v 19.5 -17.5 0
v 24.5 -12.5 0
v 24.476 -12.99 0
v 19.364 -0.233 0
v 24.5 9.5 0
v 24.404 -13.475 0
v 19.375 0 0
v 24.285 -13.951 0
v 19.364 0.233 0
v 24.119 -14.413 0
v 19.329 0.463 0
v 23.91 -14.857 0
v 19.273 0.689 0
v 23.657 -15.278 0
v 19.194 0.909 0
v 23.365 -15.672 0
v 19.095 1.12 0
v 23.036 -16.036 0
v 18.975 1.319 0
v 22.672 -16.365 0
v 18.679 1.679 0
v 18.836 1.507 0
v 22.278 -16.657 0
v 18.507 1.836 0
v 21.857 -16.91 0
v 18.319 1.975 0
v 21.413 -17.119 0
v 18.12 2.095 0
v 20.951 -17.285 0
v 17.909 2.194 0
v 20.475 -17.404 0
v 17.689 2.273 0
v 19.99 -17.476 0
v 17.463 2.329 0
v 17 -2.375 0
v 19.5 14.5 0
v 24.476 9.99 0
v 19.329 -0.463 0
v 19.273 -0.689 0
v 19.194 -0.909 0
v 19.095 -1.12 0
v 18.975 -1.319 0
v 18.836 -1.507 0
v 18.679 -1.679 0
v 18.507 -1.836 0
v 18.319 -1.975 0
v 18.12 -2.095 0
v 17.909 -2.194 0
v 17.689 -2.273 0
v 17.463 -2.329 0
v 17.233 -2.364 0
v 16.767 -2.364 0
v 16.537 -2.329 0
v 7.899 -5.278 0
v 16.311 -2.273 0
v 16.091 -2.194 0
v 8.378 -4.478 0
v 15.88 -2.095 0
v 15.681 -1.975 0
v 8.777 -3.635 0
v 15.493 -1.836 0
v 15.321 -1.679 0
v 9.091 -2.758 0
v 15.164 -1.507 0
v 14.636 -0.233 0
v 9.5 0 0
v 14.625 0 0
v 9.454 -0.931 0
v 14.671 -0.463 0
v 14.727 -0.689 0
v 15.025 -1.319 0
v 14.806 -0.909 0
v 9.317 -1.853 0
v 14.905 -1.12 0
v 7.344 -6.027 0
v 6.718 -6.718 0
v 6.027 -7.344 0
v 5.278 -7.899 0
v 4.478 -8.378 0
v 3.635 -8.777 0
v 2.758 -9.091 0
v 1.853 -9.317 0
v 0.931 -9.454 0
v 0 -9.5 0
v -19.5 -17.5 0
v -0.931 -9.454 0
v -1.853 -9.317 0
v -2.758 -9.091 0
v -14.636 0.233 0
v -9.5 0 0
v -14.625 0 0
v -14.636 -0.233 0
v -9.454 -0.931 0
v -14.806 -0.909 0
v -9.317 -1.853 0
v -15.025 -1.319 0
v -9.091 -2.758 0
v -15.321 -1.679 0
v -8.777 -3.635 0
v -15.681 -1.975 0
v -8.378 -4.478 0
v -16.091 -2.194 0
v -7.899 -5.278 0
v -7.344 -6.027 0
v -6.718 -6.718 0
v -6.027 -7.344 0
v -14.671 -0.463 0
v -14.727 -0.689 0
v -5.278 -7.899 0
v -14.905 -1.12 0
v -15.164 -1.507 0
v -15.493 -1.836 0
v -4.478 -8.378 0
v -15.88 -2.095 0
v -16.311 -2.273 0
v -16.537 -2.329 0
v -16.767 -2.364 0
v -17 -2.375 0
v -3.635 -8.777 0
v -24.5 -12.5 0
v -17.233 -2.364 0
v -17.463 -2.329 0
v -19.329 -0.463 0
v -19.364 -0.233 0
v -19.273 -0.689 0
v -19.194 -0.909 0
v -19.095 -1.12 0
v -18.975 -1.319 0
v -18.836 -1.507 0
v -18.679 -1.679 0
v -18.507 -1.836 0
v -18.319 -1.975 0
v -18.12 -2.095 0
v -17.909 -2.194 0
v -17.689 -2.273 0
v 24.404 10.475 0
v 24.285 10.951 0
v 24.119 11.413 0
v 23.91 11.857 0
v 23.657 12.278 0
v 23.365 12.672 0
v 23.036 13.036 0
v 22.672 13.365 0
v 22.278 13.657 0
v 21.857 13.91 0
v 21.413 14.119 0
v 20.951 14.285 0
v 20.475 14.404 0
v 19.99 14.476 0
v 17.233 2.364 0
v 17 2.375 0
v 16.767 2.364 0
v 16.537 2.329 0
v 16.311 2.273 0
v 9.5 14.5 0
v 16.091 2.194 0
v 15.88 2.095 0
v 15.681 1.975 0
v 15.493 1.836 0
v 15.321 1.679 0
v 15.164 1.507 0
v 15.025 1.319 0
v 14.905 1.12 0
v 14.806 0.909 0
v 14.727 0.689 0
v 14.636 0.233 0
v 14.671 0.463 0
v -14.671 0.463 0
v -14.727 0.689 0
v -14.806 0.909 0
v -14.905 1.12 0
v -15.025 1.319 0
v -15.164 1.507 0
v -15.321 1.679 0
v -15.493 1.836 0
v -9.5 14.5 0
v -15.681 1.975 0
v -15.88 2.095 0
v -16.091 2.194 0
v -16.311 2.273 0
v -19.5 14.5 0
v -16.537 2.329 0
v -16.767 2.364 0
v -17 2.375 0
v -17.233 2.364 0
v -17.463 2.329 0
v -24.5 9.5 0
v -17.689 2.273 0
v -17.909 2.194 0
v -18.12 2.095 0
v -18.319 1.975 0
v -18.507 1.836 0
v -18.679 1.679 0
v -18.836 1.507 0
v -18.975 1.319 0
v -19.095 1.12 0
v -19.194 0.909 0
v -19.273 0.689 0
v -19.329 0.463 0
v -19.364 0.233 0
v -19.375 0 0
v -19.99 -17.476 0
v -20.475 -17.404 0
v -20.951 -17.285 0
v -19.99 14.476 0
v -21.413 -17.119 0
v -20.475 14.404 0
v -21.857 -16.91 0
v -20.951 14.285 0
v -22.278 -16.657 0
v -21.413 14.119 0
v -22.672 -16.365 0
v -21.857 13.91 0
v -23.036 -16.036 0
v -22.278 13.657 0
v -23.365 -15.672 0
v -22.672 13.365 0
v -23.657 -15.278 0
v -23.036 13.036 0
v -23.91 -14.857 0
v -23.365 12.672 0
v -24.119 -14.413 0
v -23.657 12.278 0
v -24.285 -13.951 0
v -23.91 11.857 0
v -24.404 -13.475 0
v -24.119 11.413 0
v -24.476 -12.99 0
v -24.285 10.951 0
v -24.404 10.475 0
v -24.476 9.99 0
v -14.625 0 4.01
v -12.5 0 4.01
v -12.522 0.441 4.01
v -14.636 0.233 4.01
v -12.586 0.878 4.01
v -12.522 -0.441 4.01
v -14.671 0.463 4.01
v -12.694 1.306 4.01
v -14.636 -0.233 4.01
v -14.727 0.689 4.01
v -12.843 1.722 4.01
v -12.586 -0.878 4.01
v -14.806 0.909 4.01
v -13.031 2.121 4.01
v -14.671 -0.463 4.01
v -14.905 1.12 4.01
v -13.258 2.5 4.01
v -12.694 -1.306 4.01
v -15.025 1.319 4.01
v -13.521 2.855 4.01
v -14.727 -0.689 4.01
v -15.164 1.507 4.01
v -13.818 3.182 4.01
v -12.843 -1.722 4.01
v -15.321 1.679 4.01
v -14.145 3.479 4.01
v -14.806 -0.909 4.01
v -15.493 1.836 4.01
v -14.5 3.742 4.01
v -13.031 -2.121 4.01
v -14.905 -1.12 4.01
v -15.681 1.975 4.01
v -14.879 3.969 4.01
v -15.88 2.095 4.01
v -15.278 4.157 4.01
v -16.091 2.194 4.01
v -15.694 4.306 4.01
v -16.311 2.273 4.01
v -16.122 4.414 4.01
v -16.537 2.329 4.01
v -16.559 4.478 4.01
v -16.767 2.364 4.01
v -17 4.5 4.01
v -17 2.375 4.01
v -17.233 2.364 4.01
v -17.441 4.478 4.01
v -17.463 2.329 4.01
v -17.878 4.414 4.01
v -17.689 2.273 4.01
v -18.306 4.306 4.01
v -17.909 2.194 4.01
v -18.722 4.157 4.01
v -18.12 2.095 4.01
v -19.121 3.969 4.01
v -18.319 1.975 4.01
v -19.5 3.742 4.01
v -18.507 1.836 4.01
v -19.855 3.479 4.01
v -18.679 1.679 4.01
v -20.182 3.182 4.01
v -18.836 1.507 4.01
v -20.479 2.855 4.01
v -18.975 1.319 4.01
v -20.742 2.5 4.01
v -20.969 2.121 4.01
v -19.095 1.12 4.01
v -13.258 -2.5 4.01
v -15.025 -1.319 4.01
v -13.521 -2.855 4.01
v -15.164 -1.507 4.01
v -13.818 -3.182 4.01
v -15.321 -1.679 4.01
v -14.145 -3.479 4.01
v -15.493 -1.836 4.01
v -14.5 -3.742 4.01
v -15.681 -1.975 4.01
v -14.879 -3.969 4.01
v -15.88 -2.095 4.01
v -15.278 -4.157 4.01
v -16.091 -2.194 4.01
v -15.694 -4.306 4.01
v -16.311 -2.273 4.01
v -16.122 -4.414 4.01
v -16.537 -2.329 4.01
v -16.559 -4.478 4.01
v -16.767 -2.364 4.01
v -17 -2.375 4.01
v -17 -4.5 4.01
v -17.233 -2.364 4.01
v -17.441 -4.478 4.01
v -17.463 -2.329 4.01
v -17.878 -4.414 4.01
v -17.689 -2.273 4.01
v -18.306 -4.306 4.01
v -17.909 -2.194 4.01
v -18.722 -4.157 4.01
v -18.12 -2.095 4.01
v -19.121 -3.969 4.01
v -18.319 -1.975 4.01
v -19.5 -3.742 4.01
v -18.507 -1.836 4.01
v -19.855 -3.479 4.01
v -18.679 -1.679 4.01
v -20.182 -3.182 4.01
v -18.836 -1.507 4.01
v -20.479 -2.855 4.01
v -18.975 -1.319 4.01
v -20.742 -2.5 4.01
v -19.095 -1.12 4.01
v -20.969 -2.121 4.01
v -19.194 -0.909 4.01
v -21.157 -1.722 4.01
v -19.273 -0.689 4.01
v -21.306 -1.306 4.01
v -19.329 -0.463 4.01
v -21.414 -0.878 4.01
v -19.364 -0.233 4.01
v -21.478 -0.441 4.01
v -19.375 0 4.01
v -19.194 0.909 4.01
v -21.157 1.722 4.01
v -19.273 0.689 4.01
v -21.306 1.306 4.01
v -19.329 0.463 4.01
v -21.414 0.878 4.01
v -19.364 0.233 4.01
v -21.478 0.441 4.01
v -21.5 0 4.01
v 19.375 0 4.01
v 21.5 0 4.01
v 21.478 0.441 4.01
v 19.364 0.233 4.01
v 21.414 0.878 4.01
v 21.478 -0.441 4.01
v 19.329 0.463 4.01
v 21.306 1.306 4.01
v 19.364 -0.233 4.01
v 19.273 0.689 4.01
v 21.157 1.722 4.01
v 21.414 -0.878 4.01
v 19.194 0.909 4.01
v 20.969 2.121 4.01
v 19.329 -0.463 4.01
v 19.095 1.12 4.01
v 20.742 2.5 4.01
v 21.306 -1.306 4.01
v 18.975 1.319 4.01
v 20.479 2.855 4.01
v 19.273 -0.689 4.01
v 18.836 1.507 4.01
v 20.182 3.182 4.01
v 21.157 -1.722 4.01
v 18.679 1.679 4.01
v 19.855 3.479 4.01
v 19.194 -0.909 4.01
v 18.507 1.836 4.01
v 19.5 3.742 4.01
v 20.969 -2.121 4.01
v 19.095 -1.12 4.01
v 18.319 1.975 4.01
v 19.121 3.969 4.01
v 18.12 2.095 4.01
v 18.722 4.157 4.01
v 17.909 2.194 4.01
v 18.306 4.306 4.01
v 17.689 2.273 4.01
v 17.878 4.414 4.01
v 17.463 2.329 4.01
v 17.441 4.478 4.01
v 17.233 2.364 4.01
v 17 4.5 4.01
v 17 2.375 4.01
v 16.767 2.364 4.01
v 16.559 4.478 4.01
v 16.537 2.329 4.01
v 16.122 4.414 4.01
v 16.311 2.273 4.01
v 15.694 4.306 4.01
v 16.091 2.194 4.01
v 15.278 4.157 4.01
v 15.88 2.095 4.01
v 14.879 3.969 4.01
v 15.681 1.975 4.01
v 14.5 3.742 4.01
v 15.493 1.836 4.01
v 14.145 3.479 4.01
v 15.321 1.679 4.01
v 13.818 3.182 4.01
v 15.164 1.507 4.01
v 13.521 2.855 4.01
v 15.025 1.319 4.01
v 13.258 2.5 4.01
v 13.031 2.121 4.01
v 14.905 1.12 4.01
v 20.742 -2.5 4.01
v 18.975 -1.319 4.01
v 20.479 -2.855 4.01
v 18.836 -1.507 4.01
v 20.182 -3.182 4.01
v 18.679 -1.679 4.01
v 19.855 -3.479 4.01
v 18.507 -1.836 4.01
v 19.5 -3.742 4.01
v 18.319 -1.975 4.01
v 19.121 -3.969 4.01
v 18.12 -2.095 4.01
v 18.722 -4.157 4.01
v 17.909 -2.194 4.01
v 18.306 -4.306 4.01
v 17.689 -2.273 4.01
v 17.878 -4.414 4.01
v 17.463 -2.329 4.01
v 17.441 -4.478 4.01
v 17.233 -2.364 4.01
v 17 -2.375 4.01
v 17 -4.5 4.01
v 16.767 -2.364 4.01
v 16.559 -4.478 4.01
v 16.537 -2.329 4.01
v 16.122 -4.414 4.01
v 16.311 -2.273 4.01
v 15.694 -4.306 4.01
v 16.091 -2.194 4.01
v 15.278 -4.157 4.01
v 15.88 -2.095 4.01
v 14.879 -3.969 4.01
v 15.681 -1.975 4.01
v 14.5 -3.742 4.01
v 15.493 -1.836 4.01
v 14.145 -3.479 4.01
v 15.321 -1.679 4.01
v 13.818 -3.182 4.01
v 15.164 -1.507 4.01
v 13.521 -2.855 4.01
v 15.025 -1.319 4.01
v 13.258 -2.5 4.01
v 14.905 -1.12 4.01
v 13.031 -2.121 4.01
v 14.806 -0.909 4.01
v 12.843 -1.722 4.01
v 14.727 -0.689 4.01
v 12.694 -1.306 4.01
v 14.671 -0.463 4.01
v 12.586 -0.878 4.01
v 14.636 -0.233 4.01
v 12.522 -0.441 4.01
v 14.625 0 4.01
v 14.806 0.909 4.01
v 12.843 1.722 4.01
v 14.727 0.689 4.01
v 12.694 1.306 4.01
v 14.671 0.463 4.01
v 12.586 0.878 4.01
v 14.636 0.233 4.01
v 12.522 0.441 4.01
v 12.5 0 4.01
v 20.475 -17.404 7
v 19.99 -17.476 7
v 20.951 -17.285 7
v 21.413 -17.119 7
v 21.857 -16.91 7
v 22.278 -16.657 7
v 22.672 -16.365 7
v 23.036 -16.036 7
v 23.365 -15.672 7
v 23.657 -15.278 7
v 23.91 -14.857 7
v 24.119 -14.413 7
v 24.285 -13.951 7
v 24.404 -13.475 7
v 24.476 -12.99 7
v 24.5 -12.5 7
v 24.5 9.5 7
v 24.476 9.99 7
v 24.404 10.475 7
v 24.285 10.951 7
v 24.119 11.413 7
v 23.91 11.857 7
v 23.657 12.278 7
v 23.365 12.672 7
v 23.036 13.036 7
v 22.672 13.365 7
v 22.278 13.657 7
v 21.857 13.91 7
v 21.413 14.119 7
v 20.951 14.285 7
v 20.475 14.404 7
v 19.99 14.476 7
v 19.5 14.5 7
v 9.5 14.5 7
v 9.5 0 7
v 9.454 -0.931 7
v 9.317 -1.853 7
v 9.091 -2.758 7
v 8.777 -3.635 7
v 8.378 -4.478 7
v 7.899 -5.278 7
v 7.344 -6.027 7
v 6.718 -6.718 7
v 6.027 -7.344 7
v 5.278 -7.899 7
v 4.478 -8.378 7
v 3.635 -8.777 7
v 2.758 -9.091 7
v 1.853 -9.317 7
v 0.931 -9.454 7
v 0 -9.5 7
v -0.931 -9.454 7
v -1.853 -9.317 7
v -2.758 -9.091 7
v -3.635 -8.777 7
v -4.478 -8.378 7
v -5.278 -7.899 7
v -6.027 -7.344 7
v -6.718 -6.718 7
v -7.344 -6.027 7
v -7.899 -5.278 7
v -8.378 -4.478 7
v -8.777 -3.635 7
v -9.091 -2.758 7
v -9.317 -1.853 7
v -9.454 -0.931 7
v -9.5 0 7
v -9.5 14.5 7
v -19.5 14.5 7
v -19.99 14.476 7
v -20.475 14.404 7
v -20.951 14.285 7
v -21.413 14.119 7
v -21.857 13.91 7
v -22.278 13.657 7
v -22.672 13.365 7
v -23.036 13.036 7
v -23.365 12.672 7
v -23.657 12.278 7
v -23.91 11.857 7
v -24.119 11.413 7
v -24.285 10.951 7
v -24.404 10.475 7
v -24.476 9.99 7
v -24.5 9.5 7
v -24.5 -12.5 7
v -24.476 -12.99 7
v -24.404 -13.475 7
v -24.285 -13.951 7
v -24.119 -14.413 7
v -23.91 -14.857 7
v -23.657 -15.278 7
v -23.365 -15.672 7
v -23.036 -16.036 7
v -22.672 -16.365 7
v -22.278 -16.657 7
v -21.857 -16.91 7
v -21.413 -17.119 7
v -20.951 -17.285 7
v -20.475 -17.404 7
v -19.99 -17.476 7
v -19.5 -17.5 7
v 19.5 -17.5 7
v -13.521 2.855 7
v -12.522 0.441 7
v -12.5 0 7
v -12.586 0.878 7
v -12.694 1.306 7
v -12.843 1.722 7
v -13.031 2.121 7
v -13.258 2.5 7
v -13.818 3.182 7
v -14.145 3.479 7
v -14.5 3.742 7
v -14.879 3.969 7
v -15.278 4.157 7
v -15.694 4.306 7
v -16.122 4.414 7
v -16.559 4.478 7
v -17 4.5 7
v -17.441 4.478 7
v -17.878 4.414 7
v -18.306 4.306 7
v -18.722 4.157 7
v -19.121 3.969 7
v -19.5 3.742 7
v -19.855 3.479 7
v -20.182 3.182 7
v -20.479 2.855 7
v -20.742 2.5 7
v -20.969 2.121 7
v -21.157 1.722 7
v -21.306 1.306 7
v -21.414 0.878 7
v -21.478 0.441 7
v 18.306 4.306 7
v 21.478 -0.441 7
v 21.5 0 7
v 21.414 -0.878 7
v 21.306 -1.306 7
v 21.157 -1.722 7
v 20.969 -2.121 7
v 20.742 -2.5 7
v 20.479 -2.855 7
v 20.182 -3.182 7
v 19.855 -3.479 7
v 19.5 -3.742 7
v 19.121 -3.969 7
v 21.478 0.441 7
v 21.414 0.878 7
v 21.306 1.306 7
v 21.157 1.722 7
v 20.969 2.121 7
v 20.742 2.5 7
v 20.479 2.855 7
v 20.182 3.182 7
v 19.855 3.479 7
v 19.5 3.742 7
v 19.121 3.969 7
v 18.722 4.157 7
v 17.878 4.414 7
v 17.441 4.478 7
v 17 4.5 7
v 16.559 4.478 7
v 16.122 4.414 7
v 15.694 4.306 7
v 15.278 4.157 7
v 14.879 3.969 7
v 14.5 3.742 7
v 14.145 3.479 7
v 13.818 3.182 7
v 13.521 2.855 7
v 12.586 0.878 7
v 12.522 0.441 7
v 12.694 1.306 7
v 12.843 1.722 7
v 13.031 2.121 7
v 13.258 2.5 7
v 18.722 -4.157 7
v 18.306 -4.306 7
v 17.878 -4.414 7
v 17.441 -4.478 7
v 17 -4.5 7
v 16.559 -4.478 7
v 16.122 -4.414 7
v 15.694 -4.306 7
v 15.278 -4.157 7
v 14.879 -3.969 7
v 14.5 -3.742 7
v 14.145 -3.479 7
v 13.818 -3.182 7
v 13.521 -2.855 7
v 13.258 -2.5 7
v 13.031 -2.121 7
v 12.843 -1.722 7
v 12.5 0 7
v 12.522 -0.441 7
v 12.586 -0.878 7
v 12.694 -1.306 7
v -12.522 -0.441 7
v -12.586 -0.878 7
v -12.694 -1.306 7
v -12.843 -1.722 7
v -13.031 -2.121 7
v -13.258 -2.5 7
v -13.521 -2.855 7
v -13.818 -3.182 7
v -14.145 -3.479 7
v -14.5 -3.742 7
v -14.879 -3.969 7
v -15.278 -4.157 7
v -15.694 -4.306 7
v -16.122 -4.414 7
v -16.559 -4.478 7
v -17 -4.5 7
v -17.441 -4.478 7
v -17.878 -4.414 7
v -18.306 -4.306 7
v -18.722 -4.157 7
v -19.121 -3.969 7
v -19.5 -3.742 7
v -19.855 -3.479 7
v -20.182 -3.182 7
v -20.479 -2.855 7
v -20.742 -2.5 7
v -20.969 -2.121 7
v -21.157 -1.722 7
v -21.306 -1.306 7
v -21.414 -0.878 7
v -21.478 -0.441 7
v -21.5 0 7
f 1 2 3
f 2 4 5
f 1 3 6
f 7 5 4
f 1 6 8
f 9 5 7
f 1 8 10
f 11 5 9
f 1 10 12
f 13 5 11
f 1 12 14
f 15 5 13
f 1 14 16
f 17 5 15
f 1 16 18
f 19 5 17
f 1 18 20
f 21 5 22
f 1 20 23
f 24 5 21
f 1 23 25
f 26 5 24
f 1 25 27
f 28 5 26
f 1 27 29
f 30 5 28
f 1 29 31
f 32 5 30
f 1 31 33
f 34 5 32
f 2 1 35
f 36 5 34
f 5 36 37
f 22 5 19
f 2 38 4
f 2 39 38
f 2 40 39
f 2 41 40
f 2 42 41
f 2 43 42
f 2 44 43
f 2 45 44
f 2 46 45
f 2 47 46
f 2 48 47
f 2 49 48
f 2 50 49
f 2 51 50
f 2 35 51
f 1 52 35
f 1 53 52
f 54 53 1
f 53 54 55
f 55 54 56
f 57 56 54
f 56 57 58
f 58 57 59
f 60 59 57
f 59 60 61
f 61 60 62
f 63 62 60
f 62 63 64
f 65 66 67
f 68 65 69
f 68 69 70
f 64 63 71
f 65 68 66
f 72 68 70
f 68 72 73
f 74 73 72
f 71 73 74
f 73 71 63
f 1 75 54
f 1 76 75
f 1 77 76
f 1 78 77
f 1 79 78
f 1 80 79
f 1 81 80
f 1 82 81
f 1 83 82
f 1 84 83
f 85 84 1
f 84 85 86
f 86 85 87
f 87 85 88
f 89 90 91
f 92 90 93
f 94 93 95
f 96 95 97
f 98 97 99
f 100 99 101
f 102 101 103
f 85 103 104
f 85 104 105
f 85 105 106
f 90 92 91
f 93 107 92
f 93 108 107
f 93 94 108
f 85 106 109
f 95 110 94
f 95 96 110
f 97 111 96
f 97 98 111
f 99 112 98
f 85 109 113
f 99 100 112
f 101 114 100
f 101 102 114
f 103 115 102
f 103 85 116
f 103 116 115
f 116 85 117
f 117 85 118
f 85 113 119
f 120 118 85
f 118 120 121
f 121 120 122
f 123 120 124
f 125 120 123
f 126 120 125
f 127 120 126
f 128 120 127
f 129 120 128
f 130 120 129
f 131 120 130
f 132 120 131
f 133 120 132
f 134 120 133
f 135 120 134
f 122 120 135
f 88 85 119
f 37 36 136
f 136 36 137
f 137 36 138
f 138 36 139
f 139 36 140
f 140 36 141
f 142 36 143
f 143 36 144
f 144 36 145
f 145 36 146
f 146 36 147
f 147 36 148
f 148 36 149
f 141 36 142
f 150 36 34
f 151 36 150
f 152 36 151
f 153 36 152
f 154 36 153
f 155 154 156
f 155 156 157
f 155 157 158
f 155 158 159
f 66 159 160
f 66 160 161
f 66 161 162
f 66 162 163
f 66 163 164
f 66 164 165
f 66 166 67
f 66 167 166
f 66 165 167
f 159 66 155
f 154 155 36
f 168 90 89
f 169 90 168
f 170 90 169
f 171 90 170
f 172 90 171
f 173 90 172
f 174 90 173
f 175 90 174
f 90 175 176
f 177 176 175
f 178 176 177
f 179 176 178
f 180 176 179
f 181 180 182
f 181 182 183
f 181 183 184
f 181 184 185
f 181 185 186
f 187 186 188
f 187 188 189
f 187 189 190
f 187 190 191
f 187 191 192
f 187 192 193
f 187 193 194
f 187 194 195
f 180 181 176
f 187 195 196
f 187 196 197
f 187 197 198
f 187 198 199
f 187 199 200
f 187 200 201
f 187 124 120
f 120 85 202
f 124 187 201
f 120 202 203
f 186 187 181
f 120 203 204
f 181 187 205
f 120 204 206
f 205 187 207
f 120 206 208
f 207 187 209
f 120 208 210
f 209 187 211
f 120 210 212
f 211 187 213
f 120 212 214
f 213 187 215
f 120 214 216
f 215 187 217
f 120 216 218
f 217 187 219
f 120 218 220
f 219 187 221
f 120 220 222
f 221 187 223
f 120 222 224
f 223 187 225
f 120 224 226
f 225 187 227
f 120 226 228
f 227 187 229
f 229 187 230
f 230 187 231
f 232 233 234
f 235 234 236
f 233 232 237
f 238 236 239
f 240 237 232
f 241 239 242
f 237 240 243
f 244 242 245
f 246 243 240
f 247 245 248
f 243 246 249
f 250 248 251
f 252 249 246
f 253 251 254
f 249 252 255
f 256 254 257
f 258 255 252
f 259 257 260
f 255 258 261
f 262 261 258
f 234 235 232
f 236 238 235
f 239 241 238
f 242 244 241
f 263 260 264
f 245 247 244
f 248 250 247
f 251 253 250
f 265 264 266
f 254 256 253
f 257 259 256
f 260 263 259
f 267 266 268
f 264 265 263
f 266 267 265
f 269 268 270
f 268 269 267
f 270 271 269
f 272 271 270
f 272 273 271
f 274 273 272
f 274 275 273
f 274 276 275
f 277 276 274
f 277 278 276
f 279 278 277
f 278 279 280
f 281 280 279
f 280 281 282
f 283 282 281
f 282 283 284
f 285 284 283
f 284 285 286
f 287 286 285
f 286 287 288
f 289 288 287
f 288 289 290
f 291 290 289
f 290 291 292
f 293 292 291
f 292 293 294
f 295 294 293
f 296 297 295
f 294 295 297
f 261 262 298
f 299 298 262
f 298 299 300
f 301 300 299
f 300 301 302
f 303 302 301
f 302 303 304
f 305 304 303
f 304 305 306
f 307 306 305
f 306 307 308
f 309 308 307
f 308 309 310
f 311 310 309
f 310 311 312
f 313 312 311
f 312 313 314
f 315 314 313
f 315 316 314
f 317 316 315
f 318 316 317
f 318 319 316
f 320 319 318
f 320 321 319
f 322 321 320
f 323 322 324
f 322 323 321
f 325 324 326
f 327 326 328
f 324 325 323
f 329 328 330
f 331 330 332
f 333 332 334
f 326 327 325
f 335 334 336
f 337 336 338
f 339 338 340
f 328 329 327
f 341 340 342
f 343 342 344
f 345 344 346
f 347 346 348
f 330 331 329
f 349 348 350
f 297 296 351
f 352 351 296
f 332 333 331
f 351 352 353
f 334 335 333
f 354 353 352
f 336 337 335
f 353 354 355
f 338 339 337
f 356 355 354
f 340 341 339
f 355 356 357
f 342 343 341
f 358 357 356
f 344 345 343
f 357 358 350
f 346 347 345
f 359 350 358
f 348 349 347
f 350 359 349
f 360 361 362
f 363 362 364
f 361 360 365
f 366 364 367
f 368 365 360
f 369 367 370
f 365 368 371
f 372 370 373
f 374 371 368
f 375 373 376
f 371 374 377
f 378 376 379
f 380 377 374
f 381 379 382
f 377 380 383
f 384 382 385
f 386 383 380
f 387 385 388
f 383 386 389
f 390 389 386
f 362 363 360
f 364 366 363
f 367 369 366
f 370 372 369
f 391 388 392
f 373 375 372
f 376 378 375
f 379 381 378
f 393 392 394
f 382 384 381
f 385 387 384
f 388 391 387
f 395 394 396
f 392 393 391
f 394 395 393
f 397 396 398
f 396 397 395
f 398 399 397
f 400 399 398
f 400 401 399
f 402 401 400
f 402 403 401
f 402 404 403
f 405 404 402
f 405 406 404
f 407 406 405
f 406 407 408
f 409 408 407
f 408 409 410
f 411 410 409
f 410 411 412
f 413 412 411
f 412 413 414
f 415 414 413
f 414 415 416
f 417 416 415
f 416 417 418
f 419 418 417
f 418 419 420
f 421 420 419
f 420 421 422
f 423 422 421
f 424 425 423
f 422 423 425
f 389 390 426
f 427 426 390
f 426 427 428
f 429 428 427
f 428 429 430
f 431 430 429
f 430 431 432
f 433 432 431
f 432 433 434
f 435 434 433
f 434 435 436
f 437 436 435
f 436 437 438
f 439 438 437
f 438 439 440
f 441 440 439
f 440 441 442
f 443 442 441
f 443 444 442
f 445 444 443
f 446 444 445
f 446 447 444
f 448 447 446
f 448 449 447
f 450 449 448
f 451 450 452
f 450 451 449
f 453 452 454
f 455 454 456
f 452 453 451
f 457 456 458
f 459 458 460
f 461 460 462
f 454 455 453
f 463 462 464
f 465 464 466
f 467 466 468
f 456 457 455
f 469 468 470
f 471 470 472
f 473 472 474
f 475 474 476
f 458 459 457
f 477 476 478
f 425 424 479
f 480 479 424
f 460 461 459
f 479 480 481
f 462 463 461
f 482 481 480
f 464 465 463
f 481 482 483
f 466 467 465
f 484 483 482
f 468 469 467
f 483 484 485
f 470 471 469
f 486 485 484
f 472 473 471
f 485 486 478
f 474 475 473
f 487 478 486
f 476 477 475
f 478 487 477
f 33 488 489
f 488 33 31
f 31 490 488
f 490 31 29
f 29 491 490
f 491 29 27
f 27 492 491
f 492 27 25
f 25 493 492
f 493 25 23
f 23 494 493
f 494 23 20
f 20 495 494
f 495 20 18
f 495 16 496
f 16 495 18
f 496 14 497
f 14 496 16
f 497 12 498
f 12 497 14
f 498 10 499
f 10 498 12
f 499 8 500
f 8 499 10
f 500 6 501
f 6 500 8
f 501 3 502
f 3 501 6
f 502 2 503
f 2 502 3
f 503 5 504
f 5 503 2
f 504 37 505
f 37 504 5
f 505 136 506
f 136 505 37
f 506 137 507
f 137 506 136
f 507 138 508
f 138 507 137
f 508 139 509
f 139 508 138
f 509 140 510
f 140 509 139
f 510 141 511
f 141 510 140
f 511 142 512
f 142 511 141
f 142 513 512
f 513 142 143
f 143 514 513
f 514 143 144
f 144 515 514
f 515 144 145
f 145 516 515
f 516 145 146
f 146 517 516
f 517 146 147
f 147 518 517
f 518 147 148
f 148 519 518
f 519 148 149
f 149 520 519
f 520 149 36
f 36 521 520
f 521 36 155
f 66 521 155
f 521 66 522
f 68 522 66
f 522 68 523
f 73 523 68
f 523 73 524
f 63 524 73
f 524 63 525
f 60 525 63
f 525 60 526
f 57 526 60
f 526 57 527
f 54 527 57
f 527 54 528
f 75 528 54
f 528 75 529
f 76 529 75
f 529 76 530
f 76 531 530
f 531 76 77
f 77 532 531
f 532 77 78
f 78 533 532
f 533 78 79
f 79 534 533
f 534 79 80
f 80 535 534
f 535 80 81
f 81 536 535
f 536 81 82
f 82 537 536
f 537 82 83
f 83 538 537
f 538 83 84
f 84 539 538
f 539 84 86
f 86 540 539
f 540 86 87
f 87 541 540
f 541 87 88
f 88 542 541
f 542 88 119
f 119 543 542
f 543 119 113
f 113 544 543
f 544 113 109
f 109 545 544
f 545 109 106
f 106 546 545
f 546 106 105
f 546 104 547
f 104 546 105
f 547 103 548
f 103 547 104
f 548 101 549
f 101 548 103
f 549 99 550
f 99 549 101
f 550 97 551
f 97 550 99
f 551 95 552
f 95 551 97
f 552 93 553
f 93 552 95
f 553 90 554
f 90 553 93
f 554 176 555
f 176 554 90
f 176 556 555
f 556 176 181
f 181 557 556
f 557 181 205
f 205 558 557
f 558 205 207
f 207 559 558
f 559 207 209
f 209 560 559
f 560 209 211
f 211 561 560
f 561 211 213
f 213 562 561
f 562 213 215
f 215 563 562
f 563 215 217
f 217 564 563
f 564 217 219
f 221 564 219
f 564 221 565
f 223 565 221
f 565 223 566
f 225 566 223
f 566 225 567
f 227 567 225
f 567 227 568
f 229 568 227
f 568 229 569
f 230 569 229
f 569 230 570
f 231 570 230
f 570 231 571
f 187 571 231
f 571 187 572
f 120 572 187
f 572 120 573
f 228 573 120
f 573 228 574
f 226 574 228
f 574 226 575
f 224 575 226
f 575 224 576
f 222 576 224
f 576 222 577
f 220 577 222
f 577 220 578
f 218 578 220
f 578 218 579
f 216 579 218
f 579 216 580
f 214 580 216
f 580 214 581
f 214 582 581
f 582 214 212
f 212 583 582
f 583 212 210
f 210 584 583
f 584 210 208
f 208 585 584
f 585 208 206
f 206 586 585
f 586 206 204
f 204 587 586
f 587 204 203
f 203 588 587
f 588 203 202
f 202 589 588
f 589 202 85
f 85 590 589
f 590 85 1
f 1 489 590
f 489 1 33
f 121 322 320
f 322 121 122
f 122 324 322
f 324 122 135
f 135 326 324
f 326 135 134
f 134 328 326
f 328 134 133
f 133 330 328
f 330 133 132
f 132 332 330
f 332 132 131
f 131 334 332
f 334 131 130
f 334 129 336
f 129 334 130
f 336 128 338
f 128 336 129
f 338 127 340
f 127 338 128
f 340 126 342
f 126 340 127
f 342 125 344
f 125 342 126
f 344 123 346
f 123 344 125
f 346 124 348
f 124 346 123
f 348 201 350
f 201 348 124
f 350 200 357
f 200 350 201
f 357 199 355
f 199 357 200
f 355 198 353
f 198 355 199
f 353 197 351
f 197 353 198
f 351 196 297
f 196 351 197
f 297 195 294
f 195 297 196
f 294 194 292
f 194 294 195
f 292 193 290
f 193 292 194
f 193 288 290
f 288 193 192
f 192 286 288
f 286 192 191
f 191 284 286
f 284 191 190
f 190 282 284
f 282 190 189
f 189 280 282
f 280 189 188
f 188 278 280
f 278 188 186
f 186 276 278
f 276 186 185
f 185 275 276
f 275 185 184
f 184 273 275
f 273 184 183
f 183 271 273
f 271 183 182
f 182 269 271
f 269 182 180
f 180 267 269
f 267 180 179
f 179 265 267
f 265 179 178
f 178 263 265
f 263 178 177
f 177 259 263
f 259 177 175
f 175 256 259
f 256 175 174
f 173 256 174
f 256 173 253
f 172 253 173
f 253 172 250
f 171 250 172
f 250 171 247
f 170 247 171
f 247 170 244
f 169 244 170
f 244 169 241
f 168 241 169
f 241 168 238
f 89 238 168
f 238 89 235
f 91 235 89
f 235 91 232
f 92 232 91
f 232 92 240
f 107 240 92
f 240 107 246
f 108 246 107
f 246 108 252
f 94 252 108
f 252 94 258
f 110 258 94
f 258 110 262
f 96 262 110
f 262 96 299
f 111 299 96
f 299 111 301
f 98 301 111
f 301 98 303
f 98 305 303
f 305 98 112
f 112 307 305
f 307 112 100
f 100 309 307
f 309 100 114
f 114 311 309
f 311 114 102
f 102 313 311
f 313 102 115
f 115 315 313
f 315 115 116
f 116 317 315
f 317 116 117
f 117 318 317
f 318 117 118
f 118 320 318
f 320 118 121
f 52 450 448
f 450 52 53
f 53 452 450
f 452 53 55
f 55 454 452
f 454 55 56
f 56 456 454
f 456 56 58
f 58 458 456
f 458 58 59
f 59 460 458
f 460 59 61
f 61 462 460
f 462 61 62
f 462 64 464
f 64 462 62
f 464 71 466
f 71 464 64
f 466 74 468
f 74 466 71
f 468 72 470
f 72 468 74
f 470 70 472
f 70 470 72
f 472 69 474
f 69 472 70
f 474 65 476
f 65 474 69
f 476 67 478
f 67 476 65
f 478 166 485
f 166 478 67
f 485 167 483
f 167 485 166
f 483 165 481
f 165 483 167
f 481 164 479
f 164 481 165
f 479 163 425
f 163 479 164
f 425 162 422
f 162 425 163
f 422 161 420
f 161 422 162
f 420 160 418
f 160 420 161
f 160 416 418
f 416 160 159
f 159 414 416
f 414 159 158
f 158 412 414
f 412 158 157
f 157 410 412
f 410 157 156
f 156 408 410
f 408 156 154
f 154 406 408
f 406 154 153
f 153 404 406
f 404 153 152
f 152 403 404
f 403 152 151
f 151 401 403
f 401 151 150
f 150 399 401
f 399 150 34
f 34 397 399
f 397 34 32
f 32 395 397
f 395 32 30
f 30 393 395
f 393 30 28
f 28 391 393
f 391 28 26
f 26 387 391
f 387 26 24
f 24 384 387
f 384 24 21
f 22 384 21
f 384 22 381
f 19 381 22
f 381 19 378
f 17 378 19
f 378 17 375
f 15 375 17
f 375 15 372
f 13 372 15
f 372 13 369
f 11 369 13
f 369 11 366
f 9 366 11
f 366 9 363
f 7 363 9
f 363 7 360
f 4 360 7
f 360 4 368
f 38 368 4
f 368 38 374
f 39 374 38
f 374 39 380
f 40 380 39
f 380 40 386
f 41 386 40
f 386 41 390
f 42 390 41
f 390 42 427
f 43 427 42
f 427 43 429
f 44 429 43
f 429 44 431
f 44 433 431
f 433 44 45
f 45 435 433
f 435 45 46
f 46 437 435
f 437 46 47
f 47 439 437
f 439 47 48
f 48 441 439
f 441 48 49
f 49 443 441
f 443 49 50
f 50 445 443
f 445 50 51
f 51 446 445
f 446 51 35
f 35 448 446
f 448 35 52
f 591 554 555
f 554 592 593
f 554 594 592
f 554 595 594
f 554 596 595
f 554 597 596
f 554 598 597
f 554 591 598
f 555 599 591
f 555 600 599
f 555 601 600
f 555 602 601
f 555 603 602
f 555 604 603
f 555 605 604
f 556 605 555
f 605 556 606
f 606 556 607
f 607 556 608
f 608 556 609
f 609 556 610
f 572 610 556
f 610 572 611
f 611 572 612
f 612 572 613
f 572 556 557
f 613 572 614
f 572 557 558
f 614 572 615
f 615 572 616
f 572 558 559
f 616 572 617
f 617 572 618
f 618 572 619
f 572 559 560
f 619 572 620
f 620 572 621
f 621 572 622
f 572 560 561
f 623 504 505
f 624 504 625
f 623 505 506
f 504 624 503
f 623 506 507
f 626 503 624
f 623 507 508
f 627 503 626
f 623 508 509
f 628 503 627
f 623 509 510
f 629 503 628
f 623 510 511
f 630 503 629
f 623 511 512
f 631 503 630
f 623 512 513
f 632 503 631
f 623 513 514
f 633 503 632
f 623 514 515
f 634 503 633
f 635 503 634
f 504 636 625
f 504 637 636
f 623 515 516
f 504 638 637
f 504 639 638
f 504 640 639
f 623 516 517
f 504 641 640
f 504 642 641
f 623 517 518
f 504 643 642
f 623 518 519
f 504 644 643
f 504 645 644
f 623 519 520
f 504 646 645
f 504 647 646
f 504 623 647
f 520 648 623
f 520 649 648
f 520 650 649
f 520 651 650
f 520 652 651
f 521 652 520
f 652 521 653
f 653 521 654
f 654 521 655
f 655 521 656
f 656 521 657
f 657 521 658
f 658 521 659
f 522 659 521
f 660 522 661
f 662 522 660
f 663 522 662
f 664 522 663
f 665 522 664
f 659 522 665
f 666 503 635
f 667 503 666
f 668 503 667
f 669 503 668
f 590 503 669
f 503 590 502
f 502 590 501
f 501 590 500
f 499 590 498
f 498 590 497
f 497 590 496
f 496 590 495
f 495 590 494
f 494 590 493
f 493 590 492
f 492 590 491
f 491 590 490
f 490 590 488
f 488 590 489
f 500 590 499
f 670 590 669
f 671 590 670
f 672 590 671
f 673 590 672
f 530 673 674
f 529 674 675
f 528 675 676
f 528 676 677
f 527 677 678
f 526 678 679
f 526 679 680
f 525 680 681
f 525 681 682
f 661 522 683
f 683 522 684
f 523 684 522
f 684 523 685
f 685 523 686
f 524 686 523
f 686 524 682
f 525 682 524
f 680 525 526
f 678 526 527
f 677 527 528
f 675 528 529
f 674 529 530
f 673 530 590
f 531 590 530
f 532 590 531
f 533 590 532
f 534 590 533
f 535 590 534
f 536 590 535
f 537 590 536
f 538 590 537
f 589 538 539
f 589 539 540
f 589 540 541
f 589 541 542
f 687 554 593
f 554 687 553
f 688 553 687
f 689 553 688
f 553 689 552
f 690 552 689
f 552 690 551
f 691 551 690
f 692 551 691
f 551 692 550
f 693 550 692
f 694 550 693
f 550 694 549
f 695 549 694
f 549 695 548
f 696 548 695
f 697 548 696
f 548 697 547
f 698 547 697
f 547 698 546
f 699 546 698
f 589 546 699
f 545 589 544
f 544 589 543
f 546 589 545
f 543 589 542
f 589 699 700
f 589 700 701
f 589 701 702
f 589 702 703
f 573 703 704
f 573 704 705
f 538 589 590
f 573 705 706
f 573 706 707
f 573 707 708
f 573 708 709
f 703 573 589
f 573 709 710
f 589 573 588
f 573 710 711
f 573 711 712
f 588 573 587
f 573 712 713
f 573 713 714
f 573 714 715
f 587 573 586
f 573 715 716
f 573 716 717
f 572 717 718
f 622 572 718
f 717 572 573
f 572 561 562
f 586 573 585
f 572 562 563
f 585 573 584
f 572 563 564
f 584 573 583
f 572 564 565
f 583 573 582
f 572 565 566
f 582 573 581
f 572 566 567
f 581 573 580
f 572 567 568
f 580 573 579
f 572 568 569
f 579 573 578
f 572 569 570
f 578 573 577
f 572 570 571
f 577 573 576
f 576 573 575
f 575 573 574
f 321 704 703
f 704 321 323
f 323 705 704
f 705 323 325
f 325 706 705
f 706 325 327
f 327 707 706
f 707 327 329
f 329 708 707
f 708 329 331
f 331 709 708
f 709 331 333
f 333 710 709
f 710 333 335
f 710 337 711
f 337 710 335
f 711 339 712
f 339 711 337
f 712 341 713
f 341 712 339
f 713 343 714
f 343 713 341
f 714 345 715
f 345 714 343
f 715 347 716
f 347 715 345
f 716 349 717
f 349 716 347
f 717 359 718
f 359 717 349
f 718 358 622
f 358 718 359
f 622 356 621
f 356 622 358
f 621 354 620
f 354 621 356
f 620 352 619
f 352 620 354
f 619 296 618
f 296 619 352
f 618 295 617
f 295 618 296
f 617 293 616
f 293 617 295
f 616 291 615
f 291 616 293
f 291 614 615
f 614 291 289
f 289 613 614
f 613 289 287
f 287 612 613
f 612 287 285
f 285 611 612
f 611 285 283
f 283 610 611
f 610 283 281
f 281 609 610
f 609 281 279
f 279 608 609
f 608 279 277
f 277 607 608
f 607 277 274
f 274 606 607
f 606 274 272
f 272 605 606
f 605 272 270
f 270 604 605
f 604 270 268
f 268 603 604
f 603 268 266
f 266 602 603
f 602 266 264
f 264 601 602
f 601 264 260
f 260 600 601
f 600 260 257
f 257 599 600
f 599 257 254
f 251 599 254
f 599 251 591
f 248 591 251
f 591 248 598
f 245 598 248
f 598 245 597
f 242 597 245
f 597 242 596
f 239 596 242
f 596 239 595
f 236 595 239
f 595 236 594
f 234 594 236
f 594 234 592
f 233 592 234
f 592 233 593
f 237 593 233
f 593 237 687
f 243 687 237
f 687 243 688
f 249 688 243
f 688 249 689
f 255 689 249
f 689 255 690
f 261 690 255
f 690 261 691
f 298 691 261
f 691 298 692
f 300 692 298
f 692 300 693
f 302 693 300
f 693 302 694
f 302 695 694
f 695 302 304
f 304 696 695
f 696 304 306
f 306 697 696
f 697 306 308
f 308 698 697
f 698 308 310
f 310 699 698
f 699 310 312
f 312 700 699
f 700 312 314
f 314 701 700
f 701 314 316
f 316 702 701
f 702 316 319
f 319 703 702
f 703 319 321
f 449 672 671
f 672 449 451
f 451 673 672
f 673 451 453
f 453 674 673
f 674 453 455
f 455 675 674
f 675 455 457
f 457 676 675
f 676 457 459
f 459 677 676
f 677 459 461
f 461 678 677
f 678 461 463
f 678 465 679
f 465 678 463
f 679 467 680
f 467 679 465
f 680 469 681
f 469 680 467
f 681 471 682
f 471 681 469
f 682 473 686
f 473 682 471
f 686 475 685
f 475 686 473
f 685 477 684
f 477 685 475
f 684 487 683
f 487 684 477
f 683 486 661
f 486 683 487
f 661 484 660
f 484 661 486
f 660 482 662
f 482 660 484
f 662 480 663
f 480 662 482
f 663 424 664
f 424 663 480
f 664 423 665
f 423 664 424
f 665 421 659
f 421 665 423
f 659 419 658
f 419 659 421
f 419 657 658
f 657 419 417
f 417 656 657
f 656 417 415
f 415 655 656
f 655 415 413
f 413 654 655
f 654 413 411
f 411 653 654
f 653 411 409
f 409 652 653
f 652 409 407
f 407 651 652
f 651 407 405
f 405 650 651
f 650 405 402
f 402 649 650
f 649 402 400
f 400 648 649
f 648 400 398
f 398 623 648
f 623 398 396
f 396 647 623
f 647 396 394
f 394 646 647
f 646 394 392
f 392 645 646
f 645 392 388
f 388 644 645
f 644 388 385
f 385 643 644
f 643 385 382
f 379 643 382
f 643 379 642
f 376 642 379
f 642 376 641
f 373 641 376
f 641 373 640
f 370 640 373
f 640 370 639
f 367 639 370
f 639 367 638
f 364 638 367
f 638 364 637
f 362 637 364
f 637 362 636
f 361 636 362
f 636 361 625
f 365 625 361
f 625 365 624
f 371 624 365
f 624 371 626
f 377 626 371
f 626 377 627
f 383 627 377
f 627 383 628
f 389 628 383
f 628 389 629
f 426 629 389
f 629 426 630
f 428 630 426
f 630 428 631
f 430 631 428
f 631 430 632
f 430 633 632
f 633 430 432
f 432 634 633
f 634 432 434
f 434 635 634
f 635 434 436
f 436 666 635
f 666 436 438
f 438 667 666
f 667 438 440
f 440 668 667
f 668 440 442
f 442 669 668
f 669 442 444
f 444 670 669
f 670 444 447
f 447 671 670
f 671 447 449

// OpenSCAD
// This file was processed by resolve-include.py [https://github.com/arpruss/miscellaneous-scad/blob/master/scripts/resolve-include.py] 
// to include  all the dependencies inside one file.


beamWidth = 16;
beamHeight = 21;
tolerance = 1.5;
depth = 7;
bottomFlange = 8;
sideFlange = 15;
screwHole = 4.75;
rounded = 5;
screwHead = 9;
screwInset = 3;


module end_of_parameters_dummy() {}


//BEGIN DEPENDENCY: use <roundedSquare.scad>;
module roundedSquare(size=[10,10], radius=1, center=false, $fn=16) {
    size1 = (size+0==size) ? [size,size] : size;
    if (radius <= 0) {
        square(size1, center=center);
    }
    else {
        translate(center ? -size1/2 : [0,0])
        hull() {
            translate([radius,radius]) circle(r=radius);
            translate([size1[0]-radius,radius]) circle(r=radius);
            translate([size1[0]-radius,size1[1]-radius]) circle(r=radius);
            translate([radius,size1[1]-radius]) circle(r=radius);
        }
    }
}

module roundedCube(size=[10,10,10], radius=1, center=false, $fn=16) {
    linear_extrude(height=size[2])
    roundedSquare(size=[size[0],size[1]], radius=radius, center=center);
}

module roundedOpenTopBox(size=[10,10,10], radius=2, wall=1, solid=false) {
    render(convexity=2)
    difference() {
        linear_extrude(height=size[2]) roundedSquare(size=[size[0],size[1]], radius=radius);
        if (!solid) {
            translate([0,0,wall])
            linear_extrude(height=size[2]-wall)
            translate([wall,wall]) roundedSquare(size=[size[0]-2*wall,size[1]-2*wall], radius=radius-wall);
        }
    }
}

//END DEPENDENCY: use <roundedSquare.scad>;



$fn = 64;

holeWidth = beamWidth + 2*tolerance;
holeHeight = beamHeight + 2*tolerance;

module flange(screwHole=screwHole) {
    difference() {
        translate([-sideFlange-holeWidth/2,-bottomFlange-holeWidth/2]) roundedSquare([sideFlange*2+holeWidth, bottomFlange+holeHeight], radius=rounded, $fn=64);
        hull() {
            circle(d=holeWidth);
            translate([-holeWidth/2,0]) square([holeWidth,holeHeight]);
        }
        for (s=[-1,1]) translate([s*(holeWidth/2+sideFlange/2),0]) circle(d=screwHole);
    }
}

linear_extrude(height=depth-screwInset+0.01) flange(screwHole=screwHole);
translate([0,0,depth-screwInset]) linear_extrude(height=screwInset) flange(screwHole=screwHead);
